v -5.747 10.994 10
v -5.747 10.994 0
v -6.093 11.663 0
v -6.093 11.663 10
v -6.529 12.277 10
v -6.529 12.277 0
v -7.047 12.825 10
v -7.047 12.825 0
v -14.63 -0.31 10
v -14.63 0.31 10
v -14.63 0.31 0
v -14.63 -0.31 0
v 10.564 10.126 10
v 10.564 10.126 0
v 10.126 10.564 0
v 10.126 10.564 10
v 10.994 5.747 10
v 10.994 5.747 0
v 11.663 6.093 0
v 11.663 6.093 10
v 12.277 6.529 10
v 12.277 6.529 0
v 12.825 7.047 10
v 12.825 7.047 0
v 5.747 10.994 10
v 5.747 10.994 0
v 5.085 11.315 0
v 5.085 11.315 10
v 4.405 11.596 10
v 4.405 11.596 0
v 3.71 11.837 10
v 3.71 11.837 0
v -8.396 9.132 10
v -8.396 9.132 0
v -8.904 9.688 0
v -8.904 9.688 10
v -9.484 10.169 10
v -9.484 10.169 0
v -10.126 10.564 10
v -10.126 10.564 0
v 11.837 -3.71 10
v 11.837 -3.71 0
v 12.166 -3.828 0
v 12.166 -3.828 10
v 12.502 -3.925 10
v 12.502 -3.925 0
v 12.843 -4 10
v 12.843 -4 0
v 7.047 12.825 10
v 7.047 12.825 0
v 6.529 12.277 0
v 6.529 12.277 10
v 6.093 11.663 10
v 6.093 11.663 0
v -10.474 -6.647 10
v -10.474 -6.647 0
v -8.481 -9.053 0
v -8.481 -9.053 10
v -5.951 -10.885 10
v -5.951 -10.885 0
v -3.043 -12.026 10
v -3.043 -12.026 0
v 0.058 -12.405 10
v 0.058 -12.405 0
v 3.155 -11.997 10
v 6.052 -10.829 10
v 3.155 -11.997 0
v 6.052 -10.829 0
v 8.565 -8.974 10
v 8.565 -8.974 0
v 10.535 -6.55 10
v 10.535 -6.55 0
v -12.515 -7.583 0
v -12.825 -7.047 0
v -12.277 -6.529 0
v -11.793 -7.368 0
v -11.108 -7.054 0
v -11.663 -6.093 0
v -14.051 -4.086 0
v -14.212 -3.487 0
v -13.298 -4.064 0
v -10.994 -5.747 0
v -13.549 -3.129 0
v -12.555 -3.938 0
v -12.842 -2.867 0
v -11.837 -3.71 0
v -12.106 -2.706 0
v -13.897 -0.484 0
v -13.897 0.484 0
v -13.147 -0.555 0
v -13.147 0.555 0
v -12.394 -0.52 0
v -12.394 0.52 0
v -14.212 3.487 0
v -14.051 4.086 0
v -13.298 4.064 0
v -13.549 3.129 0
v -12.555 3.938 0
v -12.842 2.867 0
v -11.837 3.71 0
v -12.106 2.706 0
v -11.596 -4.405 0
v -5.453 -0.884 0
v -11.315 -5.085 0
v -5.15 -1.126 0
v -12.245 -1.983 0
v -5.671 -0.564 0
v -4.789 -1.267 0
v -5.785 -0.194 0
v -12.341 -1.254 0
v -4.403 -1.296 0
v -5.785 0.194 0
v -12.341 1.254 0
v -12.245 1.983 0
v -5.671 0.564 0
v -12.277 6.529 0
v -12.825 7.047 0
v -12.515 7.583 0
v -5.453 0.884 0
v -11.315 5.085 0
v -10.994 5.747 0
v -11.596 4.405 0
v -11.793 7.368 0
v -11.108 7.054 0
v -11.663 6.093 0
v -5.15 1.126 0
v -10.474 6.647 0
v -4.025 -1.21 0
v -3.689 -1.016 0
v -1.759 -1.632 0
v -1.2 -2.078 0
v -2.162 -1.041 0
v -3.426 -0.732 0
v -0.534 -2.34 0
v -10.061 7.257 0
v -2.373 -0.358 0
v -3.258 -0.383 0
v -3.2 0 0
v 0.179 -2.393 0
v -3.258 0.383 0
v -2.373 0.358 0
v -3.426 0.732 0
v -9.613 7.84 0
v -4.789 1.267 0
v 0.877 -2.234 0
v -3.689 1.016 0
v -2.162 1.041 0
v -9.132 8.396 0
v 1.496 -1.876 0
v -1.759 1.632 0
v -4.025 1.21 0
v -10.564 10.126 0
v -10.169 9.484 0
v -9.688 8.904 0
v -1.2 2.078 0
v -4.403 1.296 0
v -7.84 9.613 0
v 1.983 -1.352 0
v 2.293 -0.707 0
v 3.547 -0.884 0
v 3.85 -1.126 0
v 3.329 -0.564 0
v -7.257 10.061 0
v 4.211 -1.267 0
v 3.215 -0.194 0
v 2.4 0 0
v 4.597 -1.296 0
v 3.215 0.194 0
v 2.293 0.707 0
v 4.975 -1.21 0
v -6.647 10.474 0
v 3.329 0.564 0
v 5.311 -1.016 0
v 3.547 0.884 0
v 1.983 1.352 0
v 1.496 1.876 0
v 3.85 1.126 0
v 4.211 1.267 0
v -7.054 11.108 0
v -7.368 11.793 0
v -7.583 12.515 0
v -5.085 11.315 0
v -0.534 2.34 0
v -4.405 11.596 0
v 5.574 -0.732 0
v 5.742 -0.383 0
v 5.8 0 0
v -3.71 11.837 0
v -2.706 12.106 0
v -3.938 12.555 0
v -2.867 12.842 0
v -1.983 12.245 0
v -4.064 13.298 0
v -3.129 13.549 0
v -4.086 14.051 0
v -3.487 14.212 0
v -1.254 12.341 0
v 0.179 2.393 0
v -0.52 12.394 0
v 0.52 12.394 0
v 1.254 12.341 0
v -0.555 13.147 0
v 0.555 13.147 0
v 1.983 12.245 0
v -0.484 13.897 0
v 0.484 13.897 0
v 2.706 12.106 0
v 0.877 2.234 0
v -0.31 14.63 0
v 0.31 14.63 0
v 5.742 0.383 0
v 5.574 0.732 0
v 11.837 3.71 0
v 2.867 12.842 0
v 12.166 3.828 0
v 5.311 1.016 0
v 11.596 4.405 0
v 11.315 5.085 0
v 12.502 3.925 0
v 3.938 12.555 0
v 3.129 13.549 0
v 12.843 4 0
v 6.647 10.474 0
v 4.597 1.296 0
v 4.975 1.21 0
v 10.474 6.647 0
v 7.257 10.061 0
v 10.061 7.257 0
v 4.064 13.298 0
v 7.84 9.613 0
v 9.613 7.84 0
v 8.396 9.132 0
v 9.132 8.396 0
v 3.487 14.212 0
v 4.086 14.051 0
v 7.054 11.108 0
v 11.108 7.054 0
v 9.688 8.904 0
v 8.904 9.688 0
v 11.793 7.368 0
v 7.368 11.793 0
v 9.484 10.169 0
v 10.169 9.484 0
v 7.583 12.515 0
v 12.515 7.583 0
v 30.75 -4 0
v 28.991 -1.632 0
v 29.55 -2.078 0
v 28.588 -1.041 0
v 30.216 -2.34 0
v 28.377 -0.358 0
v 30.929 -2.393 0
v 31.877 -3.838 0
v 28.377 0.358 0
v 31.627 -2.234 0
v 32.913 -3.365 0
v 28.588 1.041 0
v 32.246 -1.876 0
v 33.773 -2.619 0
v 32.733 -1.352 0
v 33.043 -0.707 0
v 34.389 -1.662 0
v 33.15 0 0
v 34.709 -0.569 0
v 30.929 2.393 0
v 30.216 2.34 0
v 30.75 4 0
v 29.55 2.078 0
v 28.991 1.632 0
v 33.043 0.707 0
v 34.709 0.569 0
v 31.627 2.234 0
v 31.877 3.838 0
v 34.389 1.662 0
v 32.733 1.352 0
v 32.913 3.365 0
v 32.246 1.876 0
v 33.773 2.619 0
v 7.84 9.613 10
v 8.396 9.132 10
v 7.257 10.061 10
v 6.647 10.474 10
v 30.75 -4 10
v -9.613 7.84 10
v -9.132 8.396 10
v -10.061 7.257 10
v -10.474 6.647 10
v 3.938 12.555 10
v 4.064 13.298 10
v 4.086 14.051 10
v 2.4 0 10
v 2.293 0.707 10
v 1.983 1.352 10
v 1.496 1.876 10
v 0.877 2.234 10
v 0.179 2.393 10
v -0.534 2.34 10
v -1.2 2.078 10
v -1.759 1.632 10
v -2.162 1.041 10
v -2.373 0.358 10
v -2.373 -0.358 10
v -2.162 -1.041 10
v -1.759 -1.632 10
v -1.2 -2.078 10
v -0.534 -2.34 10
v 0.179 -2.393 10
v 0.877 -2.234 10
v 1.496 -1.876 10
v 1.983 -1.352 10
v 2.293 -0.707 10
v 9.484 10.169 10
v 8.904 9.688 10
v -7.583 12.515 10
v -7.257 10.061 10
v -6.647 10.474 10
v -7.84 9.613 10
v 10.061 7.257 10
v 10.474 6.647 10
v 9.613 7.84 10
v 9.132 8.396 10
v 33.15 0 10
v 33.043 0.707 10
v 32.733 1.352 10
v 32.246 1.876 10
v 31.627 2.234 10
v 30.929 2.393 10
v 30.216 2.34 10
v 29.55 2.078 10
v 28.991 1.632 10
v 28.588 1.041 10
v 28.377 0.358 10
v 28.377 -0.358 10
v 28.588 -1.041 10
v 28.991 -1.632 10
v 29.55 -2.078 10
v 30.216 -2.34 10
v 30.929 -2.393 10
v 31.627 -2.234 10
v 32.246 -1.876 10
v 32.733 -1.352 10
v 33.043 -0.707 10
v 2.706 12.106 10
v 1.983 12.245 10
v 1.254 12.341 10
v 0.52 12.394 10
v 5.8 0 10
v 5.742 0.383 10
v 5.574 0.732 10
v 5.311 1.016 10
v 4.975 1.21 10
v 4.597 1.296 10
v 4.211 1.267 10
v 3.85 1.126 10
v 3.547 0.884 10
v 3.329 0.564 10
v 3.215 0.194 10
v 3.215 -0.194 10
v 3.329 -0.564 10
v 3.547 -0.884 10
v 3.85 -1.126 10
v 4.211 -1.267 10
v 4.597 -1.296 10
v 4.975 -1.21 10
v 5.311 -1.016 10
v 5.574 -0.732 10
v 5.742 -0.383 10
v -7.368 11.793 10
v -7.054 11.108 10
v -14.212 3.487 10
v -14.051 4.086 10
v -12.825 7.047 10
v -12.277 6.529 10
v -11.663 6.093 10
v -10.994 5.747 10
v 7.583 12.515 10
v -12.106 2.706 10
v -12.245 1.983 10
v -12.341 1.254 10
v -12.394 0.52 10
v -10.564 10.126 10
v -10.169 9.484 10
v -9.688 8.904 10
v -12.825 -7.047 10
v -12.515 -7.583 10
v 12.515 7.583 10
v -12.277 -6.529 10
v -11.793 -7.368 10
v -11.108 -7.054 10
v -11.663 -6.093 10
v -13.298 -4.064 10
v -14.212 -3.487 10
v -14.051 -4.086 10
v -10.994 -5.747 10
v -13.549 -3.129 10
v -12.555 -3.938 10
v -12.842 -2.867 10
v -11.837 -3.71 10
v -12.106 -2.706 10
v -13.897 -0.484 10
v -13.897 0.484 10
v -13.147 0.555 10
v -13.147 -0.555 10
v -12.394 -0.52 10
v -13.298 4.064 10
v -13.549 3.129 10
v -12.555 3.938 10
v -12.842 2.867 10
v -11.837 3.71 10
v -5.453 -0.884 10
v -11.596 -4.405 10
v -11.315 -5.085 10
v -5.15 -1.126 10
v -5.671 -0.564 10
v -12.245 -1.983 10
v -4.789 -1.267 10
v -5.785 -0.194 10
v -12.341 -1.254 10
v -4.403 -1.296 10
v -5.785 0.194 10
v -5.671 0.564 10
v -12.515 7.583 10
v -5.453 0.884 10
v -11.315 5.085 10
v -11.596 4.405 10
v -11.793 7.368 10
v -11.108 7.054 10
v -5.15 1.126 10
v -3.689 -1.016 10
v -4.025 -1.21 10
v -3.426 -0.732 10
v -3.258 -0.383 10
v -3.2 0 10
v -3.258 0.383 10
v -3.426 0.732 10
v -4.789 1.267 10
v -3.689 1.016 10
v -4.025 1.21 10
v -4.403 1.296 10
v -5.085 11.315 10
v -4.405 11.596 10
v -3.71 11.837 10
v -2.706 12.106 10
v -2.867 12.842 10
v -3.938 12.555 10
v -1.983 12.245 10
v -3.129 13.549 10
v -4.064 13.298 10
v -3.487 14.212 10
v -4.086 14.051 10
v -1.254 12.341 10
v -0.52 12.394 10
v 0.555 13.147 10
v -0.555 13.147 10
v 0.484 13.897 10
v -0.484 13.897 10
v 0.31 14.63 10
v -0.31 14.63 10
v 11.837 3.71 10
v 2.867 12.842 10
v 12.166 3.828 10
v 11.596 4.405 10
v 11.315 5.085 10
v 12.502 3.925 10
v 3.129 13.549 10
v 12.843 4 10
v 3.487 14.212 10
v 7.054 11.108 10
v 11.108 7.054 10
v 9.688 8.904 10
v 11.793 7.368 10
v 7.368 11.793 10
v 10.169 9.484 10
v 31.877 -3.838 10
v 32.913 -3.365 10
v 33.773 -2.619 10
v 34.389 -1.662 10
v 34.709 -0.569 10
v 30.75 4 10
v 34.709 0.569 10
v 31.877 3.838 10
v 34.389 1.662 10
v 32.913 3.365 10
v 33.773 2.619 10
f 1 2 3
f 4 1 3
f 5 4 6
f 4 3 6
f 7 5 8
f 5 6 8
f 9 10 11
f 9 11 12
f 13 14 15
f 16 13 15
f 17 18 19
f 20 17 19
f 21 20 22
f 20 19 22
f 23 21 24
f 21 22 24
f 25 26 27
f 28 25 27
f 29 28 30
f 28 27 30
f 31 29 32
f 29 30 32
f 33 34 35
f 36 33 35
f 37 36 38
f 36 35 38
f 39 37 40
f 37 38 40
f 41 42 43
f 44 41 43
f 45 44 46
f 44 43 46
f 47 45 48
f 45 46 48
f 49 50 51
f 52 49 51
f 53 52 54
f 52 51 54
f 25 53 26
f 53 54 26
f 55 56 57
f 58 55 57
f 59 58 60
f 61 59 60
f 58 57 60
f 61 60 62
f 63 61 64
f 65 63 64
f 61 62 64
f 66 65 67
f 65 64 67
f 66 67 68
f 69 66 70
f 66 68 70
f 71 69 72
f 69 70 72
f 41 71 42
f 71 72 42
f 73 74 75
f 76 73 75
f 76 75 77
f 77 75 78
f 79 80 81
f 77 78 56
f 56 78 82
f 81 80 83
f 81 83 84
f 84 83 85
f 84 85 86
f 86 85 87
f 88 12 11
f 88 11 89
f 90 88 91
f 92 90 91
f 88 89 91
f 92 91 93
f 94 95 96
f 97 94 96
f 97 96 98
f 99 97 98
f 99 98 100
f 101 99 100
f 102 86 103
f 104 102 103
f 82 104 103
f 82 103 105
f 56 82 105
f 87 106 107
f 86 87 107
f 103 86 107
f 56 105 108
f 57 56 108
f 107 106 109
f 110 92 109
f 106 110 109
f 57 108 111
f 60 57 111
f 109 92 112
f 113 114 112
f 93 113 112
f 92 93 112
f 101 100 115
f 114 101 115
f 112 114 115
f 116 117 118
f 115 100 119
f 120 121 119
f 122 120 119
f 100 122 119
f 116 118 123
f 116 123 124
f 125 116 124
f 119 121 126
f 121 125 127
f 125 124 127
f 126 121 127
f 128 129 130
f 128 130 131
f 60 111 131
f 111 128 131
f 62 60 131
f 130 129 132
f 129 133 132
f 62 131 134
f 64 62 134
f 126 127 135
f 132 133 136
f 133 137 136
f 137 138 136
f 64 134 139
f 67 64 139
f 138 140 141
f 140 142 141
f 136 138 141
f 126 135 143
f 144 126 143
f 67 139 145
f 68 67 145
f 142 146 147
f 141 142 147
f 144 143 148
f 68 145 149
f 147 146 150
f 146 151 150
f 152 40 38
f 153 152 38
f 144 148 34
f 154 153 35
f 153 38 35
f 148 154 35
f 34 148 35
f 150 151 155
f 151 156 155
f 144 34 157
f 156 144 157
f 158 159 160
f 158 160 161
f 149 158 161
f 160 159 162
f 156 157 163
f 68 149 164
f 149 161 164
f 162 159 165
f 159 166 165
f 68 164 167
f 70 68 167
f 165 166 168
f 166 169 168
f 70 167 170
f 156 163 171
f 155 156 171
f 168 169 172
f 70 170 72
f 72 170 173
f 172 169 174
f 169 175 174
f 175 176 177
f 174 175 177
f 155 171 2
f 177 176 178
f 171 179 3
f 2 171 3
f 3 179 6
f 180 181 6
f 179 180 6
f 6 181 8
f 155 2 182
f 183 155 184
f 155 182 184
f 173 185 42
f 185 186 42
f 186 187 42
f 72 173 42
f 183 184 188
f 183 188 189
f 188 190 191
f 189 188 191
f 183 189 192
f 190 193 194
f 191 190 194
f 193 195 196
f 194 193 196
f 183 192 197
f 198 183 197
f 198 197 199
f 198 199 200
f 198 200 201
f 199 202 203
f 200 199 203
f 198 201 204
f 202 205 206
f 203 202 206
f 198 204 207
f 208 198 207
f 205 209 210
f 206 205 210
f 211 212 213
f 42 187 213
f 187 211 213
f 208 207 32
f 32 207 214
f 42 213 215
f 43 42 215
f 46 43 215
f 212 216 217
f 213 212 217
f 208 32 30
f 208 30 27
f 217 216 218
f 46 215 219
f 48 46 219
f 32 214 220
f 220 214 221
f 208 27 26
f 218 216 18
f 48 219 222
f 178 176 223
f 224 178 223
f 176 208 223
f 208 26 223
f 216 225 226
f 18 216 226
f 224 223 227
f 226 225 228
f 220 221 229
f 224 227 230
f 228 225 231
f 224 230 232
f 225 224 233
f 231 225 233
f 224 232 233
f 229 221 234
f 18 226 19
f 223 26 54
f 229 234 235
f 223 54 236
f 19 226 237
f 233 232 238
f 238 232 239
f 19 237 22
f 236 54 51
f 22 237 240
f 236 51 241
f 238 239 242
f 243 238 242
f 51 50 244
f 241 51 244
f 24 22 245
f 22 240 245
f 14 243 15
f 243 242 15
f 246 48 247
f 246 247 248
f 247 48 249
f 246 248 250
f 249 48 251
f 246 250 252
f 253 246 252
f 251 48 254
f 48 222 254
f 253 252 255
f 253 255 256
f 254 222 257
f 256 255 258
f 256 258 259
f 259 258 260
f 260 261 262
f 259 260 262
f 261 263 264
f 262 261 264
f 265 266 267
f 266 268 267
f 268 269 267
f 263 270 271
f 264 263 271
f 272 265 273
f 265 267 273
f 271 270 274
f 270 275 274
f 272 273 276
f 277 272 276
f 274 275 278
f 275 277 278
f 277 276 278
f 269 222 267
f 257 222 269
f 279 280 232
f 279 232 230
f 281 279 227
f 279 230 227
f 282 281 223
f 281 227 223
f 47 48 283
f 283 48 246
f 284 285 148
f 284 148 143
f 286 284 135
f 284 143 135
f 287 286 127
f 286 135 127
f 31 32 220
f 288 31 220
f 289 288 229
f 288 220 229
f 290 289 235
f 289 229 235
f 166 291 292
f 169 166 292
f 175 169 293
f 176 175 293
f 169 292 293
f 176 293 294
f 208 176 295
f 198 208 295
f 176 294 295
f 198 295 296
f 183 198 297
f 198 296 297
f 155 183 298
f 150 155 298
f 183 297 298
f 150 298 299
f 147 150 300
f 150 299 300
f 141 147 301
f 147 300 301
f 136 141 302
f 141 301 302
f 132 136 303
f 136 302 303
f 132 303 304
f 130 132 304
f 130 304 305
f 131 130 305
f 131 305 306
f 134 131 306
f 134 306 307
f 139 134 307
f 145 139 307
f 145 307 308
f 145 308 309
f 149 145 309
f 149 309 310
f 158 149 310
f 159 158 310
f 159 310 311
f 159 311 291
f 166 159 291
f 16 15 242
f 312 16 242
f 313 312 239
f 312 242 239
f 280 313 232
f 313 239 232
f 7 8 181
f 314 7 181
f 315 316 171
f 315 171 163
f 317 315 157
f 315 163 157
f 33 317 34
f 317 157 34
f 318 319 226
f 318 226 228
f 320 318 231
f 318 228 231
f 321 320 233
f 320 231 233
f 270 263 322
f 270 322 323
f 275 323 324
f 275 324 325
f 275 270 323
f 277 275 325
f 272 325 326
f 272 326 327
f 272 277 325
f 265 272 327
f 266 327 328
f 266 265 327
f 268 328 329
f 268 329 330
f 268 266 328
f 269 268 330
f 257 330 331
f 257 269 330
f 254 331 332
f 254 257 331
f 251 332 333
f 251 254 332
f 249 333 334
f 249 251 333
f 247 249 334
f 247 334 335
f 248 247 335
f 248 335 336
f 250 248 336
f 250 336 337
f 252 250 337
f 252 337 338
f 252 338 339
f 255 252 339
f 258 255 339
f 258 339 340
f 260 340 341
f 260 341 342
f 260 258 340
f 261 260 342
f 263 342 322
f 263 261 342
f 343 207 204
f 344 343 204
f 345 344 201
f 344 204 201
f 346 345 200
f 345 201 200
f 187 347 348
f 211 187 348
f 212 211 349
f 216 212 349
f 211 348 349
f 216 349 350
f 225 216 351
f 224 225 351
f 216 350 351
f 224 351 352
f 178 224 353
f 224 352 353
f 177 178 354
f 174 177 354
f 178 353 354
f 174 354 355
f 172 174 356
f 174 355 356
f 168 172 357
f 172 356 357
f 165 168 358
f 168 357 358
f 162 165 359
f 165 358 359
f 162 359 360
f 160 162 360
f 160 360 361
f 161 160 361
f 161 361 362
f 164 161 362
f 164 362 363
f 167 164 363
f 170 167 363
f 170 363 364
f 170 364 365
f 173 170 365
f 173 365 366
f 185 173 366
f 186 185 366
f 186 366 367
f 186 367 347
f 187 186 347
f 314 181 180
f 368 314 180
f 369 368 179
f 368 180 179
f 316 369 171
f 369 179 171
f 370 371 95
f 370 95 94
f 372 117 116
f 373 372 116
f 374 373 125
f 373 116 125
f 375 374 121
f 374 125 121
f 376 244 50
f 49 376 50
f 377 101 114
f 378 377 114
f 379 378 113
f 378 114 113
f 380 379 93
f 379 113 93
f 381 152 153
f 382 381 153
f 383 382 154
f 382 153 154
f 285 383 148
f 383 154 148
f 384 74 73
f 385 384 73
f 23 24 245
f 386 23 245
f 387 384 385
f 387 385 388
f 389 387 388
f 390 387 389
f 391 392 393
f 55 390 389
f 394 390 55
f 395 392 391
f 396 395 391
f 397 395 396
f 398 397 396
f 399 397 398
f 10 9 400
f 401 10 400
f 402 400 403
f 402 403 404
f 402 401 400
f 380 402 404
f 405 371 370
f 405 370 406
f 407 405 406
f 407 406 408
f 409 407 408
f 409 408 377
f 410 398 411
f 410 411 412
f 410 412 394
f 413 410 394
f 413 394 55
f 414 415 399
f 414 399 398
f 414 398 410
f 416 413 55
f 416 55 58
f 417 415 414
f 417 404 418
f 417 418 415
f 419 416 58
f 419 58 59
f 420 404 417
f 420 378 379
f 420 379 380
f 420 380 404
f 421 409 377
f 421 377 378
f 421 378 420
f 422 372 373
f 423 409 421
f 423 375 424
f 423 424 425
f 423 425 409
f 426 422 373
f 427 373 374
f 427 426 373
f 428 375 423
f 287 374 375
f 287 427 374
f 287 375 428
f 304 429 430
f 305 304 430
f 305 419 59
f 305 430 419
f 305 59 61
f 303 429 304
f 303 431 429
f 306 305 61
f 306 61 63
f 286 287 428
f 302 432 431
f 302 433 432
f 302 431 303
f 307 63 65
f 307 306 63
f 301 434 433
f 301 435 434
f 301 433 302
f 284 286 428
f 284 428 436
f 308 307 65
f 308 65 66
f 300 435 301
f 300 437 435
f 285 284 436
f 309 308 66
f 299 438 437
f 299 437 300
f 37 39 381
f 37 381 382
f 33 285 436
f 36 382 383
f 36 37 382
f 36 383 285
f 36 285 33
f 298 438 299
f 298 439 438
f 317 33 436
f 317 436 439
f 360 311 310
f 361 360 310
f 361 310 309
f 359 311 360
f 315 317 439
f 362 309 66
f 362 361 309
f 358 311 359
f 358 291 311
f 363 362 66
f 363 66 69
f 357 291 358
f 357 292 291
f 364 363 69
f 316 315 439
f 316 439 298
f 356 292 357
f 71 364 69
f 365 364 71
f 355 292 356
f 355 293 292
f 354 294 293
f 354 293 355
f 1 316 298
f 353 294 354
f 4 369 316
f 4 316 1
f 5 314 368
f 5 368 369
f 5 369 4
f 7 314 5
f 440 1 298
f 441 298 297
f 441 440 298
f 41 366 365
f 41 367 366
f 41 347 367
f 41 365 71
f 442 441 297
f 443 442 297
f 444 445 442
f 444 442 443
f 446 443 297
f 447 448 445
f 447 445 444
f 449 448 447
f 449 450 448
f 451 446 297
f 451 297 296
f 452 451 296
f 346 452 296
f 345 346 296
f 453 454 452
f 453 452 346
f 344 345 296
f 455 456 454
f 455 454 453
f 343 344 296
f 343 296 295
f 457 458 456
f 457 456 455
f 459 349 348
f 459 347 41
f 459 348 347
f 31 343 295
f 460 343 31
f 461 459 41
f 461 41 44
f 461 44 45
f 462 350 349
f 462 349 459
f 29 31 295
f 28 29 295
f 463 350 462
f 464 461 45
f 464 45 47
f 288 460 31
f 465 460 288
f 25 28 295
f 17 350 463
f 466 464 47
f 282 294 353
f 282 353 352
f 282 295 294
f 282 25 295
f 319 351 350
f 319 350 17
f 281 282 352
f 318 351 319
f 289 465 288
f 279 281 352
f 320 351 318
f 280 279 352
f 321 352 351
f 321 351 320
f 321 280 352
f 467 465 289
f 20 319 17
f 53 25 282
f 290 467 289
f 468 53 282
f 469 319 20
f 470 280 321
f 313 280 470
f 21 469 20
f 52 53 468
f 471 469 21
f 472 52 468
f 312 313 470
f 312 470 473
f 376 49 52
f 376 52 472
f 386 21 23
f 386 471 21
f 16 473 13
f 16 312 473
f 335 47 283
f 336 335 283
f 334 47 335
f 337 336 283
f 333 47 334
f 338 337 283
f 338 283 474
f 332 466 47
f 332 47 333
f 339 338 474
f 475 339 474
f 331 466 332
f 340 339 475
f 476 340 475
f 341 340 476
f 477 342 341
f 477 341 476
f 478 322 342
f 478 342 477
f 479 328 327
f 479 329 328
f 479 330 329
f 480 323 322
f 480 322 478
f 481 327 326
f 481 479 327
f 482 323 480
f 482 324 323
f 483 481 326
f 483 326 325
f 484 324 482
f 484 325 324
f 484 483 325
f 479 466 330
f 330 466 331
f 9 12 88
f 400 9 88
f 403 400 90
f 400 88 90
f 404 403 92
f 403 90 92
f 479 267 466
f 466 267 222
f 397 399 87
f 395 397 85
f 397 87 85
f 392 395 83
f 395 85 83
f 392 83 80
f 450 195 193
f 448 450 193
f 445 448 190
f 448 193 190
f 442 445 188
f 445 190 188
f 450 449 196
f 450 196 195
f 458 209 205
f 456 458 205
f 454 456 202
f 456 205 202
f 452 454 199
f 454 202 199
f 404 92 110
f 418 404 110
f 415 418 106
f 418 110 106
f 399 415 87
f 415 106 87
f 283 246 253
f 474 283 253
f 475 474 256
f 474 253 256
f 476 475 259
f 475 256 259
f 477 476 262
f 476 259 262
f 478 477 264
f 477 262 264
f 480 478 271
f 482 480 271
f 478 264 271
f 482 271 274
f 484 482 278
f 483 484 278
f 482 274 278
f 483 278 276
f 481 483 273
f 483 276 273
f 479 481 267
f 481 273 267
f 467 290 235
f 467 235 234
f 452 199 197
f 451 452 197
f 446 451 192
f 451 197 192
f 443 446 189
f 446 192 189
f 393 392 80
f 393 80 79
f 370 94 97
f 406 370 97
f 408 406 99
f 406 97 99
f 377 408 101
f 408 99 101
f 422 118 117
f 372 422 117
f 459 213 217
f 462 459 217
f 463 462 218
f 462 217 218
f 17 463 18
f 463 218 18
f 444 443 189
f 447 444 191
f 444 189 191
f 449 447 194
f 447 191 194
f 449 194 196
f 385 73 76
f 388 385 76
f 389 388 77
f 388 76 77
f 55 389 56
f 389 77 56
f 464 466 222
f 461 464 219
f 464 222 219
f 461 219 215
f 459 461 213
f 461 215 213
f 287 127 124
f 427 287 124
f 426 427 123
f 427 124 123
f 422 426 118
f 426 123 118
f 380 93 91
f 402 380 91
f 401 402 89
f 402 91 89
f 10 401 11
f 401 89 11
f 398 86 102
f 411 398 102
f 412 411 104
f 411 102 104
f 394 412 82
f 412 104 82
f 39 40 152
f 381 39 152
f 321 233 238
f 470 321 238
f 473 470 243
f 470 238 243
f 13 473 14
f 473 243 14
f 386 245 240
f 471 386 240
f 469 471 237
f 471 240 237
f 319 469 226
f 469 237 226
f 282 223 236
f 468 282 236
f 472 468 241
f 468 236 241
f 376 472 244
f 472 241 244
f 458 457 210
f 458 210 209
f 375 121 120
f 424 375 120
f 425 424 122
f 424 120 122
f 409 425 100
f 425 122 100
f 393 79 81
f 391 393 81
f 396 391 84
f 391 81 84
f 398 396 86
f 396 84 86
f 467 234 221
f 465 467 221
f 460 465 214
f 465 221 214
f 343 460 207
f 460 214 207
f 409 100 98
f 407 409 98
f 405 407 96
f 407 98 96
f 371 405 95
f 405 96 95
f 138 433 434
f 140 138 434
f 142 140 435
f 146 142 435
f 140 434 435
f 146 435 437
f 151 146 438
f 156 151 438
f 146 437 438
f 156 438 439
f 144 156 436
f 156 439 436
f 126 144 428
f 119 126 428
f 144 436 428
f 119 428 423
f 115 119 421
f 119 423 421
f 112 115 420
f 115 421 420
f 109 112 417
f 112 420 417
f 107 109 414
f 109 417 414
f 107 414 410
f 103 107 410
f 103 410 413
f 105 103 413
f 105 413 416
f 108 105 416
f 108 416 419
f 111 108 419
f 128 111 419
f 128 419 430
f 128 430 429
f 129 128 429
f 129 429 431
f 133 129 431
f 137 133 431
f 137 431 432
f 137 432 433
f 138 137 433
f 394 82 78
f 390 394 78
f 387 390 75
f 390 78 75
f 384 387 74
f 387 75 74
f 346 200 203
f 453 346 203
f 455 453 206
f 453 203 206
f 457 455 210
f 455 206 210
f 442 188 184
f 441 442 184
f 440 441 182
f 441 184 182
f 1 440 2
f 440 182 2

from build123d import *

# Parameters (mm, degrees)
SKETCH1_R           = 2
SKETCH1_R_2         = 2.4
BOSS_EXTRUDE1_DEPTH = 10
SKETCH2_R           = 2.4
SKETCH2_R_2         = 1.3
CUT_EXTRUDE1_DEPTH  = 40.007683858


with BuildPart() as part:
    # Sketch1 → Boss-Extrude1 (new body)
    with BuildSketch(Plane.XY):
        with BuildLine():
            Line((0.31, 14.63), (-0.31, 14.63))
            ThreePointArc((-0.31, 14.63), (-0.532517386, 13.523085628), (-0.52, 12.394096377))
            ThreePointArc((-0.52, 12.394096377), (-1.619177414, 12.298873505), (-2.70554676, 12.106363687))
            ThreePointArc((-2.70554676, 12.106363687), (-2.985659813, 13.2001233), (-3.487085624, 14.211728743))
            Line((-3.487085624, 14.211728743), (-4.085959636, 14.051260935))
            ThreePointArc((-4.085959636, 14.051260935), (-4.014404405, 12.924472018), (-3.710109619, 11.837191881))
            ThreePointArc((-3.710109619, 11.837191881), (-4.747187978, 11.460725601), (-5.746714978, 10.993602319))
            ThreePointArc((-5.746714978, 10.993602319), (-6.30036923, 11.977594384), (-7.046532125, 12.824951657))
            Line((-7.046532125, 12.824951657), (-7.583467875, 12.514951657))
            ThreePointArc((-7.583467875, 12.514951657), (-7.222716398, 11.445076999), (-6.647381398, 10.473602319))
            ThreePointArc((-6.647381398, 10.473602319), (-7.551685527, 9.841548186), (-8.396254069, 9.131645121))
            ThreePointArc((-8.396254069, 9.131645121), (-9.185718896, 9.938812205), (-10.125769107, 10.564175311))
            Line((-10.125769107, 10.564175311), (-10.564175311, 10.125769107))
            ThreePointArc((-10.564175311, 10.125769107), (-9.938812205, 9.185718896), (-9.131645121, 8.396254069))
            ThreePointArc((-9.131645121, 8.396254069), (-9.841548186, 7.551685527), (-10.473602319, 6.647381398))
            ThreePointArc((-10.473602319, 6.647381398), (-11.445076999, 7.222716398), (-12.514951657, 7.583467875))
            Line((-12.514951657, 7.583467875), (-12.824951657, 7.046532125))
            ThreePointArc((-12.824951657, 7.046532125), (-11.977594384, 6.30036923), (-10.993602319, 5.746714978))
            ThreePointArc((-10.993602319, 5.746714978), (-11.460725601, 4.747187978), (-11.837191881, 3.710109619))
            ThreePointArc((-11.837191881, 3.710109619), (-12.924472018, 4.014404405), (-14.051260935, 4.085959636))
            Line((-14.051260935, 4.085959636), (-14.211728743, 3.487085624))
            ThreePointArc((-14.211728743, 3.487085624), (-13.2001233, 2.985659813), (-12.106363687, 2.70554676))
            ThreePointArc((-12.106363687, 2.70554676), (-12.298873505, 1.619177414), (-12.394096377, 0.52))
            ThreePointArc((-12.394096377, 0.52), (-13.523085628, 0.532517386), (-14.63, 0.31))
            Line((-14.63, 0.31), (-14.63, -0.31))
            ThreePointArc((-14.63, -0.31), (-13.523085628, -0.532517386), (-12.394096377, -0.52))
            ThreePointArc((-12.394096377, -0.52), (-12.298873505, -1.619177414), (-12.106363687, -2.70554676))
            ThreePointArc((-12.106363687, -2.70554676), (-13.2001233, -2.985659813), (-14.211728743, -3.487085624))
            Line((-14.211728743, -3.487085624), (-14.051260935, -4.085959636))
            ThreePointArc((-14.051260935, -4.085959636), (-12.924472018, -4.014404405), (-11.837191881, -3.710109619))
            ThreePointArc((-11.837191881, -3.710109619), (-11.460725601, -4.747187978), (-10.993602319, -5.746714978))
            ThreePointArc((-10.993602319, -5.746714978), (-11.977594384, -6.30036923), (-12.824951657, -7.046532125))
            Line((-12.824951657, -7.046532125), (-12.514951657, -7.583467875))
            ThreePointArc((-12.514951657, -7.583467875), (-11.445076999, -7.222716398), (-10.473602319, -6.647381398))
            ThreePointArc((-10.473602319, -6.647381398), (1.619177414, -12.298873505), (11.837191881, -3.710109619))
            ThreePointArc((11.837191881, -3.710109619), (12.333238692, -3.879500788), (12.84337176, -4))
            Line((12.84337176, -4), (30.75, -4))
            ThreePointArc((30.75, -4), (34.75, 0), (30.75, 4))
            Line((30.75, 4), (12.84337176, 4))
            ThreePointArc((12.84337176, 4), (12.333238692, 3.879500788), (11.837191881, 3.710109619))
            ThreePointArc((11.837191881, 3.710109619), (11.460725601, 4.747187978), (10.993602319, 5.746714978))
            ThreePointArc((10.993602319, 5.746714978), (11.977594384, 6.30036923), (12.824951657, 7.046532125))
            Line((12.824951657, 7.046532125), (12.514951657, 7.583467875))
            ThreePointArc((12.514951657, 7.583467875), (11.445076999, 7.222716398), (10.473602319, 6.647381398))
            ThreePointArc((10.473602319, 6.647381398), (9.841548186, 7.551685527), (9.131645121, 8.396254069))
            ThreePointArc((9.131645121, 8.396254069), (9.938812205, 9.185718896), (10.564175311, 10.125769107))
            Line((10.564175311, 10.125769107), (10.125769107, 10.564175311))
            ThreePointArc((10.125769107, 10.564175311), (9.185718896, 9.938812205), (8.396254069, 9.131645121))
            ThreePointArc((8.396254069, 9.131645121), (7.551685527, 9.841548186), (6.647381398, 10.473602319))
            ThreePointArc((6.647381398, 10.473602319), (7.222716398, 11.445076999), (7.583467875, 12.514951657))
            Line((7.583467875, 12.514951657), (7.046532125, 12.824951657))
            ThreePointArc((7.046532125, 12.824951657), (6.30036923, 11.977594384), (5.746714978, 10.993602319))
            ThreePointArc((5.746714978, 10.993602319), (4.747187978, 11.460725601), (3.710109619, 11.837191881))
            ThreePointArc((3.710109619, 11.837191881), (4.014404405, 12.924472018), (4.085959636, 14.051260935))
            Line((4.085959636, 14.051260935), (3.487085624, 14.211728743))
            ThreePointArc((3.487085624, 14.211728743), (2.985659813, 13.2001233), (2.70554676, 12.106363687))
            ThreePointArc((2.70554676, 12.106363687), (1.619177414, 12.298873505), (0.52, 12.394096377))
            ThreePointArc((0.52, 12.394096377), (0.532517386, 13.523085628), (0.31, 14.63))
        make_face()
        Circle(SKETCH1_R, mode=Mode.SUBTRACT)
        with Locations((30.75, 0)):
            Circle(SKETCH1_R_2, mode=Mode.SUBTRACT)
    extrude(amount=BOSS_EXTRUDE1_DEPTH)

    # Sketch2 → Cut-Extrude1 (cut, through all)
    with BuildSketch(Plane.XY.offset(10)):
        Circle(SKETCH2_R)
        with Locations((4.5, 0)):
            Circle(SKETCH2_R_2)
        with Locations((-4.5, 0)):
            Circle(SKETCH2_R_2)
    extrude(amount=-CUT_EXTRUDE1_DEPTH, mode=Mode.SUBTRACT)


solid = part.part
